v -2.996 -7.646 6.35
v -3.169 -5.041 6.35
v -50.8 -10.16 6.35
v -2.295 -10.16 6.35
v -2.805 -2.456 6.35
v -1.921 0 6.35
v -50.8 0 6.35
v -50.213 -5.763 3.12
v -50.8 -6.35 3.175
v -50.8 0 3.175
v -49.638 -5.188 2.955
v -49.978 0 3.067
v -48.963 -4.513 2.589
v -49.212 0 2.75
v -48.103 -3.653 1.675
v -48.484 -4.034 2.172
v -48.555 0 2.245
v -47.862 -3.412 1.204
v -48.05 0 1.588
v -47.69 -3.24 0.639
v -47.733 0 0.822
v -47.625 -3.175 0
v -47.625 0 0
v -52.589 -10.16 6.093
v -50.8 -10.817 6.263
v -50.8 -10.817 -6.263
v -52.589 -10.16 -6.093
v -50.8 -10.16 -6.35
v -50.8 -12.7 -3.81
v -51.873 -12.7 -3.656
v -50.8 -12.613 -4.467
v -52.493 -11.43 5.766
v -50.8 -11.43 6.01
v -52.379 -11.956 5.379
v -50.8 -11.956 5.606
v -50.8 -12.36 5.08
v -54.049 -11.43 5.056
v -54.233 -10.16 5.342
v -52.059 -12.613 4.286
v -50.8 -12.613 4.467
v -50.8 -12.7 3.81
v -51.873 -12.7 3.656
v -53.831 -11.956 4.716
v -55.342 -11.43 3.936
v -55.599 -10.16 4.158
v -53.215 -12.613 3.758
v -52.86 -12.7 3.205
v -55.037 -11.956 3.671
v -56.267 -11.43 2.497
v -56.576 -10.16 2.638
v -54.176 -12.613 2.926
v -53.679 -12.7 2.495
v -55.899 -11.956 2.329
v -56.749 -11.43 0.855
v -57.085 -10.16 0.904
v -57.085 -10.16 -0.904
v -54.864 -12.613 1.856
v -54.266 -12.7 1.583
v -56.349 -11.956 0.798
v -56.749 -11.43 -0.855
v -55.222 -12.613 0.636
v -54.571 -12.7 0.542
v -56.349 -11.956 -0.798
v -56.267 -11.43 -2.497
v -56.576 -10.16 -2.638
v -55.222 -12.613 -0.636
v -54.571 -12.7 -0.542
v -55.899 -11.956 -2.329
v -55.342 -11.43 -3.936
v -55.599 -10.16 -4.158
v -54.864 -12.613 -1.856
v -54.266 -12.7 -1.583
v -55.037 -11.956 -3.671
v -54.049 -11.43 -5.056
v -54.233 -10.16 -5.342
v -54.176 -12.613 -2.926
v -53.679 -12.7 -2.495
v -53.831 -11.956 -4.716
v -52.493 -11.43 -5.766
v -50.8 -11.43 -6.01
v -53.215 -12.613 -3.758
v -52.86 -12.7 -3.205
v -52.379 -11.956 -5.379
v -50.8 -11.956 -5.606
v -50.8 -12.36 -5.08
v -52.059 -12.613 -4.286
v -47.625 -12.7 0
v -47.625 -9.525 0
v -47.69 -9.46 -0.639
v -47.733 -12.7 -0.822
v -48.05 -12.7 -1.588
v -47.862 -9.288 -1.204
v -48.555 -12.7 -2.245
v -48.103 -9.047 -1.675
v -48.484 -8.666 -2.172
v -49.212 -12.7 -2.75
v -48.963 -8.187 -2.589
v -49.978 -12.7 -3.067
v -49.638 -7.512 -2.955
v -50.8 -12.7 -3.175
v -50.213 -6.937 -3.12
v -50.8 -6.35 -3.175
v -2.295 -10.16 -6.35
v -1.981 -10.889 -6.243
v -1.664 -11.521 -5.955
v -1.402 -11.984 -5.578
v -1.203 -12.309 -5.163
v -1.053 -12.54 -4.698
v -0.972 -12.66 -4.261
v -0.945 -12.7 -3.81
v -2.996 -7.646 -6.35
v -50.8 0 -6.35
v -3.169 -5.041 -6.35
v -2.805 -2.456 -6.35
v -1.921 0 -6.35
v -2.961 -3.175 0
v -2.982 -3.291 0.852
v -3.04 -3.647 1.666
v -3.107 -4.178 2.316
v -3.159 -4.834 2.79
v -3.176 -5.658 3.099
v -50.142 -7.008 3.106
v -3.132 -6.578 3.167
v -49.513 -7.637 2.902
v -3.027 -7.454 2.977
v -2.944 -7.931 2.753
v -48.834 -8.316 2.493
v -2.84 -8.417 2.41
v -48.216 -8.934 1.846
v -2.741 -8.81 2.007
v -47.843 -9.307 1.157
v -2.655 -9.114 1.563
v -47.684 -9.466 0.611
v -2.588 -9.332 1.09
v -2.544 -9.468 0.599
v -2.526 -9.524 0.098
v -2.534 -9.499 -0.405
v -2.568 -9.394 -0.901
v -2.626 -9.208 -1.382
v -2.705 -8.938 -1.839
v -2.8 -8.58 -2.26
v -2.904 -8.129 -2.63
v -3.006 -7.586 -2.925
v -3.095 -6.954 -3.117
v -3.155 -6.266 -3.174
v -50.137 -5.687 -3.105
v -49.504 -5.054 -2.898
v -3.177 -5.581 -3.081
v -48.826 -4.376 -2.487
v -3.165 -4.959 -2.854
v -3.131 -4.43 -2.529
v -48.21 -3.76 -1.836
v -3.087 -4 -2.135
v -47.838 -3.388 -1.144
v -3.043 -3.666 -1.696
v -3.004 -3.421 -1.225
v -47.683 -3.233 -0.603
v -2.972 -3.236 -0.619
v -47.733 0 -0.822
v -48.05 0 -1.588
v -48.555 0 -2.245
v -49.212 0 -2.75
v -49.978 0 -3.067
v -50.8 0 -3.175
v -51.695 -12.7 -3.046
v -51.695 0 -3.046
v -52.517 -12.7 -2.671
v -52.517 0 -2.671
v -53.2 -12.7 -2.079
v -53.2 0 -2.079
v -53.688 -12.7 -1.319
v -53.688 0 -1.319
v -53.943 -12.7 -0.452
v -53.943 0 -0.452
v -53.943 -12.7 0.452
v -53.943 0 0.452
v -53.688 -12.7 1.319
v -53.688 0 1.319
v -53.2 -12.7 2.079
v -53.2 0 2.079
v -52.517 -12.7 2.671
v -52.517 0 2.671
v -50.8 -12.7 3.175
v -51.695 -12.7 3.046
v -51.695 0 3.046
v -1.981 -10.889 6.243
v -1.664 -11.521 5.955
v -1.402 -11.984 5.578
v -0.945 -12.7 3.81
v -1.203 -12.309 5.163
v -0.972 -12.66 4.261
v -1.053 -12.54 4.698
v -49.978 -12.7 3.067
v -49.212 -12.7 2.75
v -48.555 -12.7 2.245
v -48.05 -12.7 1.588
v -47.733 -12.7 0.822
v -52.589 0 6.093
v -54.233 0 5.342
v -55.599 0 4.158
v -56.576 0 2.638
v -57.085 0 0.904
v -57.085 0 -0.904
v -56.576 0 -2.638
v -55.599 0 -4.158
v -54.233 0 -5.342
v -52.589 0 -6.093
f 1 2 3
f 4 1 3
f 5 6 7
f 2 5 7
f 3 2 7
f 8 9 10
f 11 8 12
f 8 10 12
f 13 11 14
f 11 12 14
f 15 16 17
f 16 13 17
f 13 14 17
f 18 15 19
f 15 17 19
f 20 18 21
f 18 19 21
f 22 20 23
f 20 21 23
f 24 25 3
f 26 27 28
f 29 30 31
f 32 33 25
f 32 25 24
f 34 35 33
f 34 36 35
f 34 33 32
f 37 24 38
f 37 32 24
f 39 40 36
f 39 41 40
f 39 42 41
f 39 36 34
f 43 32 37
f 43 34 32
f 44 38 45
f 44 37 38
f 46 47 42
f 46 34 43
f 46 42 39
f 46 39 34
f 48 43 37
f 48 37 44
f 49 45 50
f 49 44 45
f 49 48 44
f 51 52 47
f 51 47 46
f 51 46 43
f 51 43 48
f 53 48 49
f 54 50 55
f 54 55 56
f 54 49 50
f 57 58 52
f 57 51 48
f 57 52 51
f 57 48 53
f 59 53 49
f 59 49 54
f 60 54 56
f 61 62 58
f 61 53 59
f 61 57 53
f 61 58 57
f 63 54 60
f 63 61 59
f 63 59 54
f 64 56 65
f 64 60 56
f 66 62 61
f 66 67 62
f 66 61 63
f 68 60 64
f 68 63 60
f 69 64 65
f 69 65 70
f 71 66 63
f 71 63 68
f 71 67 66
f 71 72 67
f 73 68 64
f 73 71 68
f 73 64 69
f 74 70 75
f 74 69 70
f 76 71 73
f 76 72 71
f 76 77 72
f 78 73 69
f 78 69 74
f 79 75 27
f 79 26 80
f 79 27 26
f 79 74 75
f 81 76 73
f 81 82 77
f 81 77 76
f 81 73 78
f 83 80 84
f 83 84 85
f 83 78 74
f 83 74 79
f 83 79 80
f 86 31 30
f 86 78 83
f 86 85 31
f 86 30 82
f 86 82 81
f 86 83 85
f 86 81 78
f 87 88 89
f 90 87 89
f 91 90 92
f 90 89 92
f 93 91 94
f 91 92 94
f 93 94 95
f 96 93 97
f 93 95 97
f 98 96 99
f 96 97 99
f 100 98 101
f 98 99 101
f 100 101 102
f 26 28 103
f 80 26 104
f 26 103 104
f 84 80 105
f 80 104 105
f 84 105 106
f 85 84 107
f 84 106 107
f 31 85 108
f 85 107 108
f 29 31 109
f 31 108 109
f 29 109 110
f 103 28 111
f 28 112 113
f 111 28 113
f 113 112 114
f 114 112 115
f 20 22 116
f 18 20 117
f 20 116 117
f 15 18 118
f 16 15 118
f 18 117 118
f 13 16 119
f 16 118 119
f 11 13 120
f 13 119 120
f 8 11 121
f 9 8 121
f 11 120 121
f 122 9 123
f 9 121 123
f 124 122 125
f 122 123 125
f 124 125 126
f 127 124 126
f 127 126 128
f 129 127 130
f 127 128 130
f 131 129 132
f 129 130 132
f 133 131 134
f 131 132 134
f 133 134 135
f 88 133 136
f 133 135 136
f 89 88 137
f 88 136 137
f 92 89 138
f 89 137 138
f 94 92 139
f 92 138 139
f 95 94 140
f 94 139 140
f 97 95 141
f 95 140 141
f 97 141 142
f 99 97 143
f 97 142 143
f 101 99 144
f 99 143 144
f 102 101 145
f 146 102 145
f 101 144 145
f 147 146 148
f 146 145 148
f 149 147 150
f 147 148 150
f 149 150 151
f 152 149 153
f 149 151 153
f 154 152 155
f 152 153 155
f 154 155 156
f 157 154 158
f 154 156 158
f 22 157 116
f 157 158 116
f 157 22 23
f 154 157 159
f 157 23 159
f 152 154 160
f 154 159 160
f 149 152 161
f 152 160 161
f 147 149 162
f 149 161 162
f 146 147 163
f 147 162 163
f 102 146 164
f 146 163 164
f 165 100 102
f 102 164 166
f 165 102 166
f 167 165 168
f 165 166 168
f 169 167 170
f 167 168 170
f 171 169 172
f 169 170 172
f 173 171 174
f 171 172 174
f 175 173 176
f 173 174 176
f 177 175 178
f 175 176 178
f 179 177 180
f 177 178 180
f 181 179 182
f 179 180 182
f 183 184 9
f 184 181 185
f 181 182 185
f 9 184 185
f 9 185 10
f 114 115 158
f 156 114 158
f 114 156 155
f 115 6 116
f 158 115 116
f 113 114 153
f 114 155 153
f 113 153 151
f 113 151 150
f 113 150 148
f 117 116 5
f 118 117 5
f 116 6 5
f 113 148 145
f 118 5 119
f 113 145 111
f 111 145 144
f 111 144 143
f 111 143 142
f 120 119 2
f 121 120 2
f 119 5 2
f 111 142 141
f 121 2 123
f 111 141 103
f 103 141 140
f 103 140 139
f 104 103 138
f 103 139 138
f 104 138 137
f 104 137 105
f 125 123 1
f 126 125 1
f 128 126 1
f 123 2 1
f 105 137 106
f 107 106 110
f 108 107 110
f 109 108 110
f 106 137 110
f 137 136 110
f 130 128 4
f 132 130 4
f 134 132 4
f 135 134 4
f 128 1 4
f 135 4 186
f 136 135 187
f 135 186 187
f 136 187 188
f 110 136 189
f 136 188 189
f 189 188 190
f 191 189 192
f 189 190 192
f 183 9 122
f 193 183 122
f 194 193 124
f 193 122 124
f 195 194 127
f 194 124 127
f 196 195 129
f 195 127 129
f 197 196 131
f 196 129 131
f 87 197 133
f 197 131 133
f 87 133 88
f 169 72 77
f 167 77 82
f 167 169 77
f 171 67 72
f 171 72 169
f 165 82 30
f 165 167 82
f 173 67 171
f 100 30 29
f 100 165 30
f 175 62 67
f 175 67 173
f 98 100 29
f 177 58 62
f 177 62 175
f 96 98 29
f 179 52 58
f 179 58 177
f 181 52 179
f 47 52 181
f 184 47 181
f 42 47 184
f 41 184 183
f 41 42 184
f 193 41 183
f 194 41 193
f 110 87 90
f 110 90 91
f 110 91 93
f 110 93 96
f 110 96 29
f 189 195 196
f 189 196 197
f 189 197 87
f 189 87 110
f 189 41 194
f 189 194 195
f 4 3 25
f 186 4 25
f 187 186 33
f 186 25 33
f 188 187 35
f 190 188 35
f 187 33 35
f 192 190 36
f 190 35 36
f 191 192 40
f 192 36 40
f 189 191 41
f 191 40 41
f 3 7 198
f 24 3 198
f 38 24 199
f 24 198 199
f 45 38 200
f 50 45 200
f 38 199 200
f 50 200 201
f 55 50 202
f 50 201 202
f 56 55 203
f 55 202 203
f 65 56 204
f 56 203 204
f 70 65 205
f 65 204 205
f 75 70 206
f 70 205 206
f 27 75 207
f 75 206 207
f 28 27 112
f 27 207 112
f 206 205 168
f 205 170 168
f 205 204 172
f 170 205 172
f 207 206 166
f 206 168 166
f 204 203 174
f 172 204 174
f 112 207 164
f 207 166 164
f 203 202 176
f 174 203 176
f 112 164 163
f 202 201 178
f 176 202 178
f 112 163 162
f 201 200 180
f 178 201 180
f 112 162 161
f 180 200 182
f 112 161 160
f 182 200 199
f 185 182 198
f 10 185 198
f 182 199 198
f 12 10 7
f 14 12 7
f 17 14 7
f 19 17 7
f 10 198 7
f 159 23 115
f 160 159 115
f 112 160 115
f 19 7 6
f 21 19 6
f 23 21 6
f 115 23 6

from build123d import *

# Parameters (mm, degrees)
F1_DEPTH = 12.7
F2_R     = 2.54
F3_R     = 3.175
F4_DEPTH = 50.8
F5_R     = 12.7
F6_DEPTH = 38.1


with BuildPart() as f1:
    # F0 (on Front) → F1 (new body)
    with BuildSketch(Plane.XZ):
        with BuildLine():
            ThreePointArc((-50.8, -6.35), (-46.3098719395, -4.4901280605), (-44.45, 0))
            ThreePointArc((-44.45, 0), (-46.3098719395, 4.4901280605), (-50.8, 6.35))
            Line((-50.8, 6.35), (-50.8, 3.175))
            ThreePointArc((-50.8, 3.175), (-48.5549359697, 2.2450640303), (-47.625, 0))
            ThreePointArc((-47.625, 0), (-48.5549359697, -2.2450640303), (-50.8, -3.175))
            Line((-50.8, -3.175), (-50.8, -6.35))
        make_face()
        with BuildLine():
            ThreePointArc((-50.8, 6.35), (-46.3098719395, 4.4901280605), (-44.45, 0))
            ThreePointArc((-44.45, 0), (-46.3098719395, -4.4901280605), (-50.8, -6.35))
            Line((-50.8, -6.35), (0, -6.35))
            Line((0, -6.35), (0, 6.35))
            Line((0, 6.35), (-50.8, 6.35))
        make_face()
        with BuildLine():
            Line((-50.8, 3.175), (-50.8, 6.35))
            ThreePointArc((-50.8, 6.35), (-57.15, 0), (-50.8, -6.35))
            Line((-50.8, -6.35), (-50.8, -3.175))
            ThreePointArc((-50.8, -3.175), (-53.975, 0), (-50.8, 3.175))
        make_face()
    extrude(amount=F1_DEPTH)

    # F2
    f2_edges = [f1.edges().sort_by_distance(p)[0] for p in [
        (-25.4, -12.7, -6.35),
    ]]
    fillet(f2_edges, radius=F2_R)

    # F3 (on Right) → F4 (cut, symmetric)
    with BuildSketch(Plane.YZ):
        with Locations((-6.35, 0)):
            Circle(F3_R)
    extrude(amount=F4_DEPTH, both=True, mode=Mode.SUBTRACT)

    # F5 (on Top) → F6 (cut, symmetric)
    with BuildSketch(Plane.XY):
        with Locations((9.5227770507, -5.5082733743)):
            Circle(F5_R)
    extrude(amount=F6_DEPTH, both=True, mode=Mode.SUBTRACT)


solid = f1.part
